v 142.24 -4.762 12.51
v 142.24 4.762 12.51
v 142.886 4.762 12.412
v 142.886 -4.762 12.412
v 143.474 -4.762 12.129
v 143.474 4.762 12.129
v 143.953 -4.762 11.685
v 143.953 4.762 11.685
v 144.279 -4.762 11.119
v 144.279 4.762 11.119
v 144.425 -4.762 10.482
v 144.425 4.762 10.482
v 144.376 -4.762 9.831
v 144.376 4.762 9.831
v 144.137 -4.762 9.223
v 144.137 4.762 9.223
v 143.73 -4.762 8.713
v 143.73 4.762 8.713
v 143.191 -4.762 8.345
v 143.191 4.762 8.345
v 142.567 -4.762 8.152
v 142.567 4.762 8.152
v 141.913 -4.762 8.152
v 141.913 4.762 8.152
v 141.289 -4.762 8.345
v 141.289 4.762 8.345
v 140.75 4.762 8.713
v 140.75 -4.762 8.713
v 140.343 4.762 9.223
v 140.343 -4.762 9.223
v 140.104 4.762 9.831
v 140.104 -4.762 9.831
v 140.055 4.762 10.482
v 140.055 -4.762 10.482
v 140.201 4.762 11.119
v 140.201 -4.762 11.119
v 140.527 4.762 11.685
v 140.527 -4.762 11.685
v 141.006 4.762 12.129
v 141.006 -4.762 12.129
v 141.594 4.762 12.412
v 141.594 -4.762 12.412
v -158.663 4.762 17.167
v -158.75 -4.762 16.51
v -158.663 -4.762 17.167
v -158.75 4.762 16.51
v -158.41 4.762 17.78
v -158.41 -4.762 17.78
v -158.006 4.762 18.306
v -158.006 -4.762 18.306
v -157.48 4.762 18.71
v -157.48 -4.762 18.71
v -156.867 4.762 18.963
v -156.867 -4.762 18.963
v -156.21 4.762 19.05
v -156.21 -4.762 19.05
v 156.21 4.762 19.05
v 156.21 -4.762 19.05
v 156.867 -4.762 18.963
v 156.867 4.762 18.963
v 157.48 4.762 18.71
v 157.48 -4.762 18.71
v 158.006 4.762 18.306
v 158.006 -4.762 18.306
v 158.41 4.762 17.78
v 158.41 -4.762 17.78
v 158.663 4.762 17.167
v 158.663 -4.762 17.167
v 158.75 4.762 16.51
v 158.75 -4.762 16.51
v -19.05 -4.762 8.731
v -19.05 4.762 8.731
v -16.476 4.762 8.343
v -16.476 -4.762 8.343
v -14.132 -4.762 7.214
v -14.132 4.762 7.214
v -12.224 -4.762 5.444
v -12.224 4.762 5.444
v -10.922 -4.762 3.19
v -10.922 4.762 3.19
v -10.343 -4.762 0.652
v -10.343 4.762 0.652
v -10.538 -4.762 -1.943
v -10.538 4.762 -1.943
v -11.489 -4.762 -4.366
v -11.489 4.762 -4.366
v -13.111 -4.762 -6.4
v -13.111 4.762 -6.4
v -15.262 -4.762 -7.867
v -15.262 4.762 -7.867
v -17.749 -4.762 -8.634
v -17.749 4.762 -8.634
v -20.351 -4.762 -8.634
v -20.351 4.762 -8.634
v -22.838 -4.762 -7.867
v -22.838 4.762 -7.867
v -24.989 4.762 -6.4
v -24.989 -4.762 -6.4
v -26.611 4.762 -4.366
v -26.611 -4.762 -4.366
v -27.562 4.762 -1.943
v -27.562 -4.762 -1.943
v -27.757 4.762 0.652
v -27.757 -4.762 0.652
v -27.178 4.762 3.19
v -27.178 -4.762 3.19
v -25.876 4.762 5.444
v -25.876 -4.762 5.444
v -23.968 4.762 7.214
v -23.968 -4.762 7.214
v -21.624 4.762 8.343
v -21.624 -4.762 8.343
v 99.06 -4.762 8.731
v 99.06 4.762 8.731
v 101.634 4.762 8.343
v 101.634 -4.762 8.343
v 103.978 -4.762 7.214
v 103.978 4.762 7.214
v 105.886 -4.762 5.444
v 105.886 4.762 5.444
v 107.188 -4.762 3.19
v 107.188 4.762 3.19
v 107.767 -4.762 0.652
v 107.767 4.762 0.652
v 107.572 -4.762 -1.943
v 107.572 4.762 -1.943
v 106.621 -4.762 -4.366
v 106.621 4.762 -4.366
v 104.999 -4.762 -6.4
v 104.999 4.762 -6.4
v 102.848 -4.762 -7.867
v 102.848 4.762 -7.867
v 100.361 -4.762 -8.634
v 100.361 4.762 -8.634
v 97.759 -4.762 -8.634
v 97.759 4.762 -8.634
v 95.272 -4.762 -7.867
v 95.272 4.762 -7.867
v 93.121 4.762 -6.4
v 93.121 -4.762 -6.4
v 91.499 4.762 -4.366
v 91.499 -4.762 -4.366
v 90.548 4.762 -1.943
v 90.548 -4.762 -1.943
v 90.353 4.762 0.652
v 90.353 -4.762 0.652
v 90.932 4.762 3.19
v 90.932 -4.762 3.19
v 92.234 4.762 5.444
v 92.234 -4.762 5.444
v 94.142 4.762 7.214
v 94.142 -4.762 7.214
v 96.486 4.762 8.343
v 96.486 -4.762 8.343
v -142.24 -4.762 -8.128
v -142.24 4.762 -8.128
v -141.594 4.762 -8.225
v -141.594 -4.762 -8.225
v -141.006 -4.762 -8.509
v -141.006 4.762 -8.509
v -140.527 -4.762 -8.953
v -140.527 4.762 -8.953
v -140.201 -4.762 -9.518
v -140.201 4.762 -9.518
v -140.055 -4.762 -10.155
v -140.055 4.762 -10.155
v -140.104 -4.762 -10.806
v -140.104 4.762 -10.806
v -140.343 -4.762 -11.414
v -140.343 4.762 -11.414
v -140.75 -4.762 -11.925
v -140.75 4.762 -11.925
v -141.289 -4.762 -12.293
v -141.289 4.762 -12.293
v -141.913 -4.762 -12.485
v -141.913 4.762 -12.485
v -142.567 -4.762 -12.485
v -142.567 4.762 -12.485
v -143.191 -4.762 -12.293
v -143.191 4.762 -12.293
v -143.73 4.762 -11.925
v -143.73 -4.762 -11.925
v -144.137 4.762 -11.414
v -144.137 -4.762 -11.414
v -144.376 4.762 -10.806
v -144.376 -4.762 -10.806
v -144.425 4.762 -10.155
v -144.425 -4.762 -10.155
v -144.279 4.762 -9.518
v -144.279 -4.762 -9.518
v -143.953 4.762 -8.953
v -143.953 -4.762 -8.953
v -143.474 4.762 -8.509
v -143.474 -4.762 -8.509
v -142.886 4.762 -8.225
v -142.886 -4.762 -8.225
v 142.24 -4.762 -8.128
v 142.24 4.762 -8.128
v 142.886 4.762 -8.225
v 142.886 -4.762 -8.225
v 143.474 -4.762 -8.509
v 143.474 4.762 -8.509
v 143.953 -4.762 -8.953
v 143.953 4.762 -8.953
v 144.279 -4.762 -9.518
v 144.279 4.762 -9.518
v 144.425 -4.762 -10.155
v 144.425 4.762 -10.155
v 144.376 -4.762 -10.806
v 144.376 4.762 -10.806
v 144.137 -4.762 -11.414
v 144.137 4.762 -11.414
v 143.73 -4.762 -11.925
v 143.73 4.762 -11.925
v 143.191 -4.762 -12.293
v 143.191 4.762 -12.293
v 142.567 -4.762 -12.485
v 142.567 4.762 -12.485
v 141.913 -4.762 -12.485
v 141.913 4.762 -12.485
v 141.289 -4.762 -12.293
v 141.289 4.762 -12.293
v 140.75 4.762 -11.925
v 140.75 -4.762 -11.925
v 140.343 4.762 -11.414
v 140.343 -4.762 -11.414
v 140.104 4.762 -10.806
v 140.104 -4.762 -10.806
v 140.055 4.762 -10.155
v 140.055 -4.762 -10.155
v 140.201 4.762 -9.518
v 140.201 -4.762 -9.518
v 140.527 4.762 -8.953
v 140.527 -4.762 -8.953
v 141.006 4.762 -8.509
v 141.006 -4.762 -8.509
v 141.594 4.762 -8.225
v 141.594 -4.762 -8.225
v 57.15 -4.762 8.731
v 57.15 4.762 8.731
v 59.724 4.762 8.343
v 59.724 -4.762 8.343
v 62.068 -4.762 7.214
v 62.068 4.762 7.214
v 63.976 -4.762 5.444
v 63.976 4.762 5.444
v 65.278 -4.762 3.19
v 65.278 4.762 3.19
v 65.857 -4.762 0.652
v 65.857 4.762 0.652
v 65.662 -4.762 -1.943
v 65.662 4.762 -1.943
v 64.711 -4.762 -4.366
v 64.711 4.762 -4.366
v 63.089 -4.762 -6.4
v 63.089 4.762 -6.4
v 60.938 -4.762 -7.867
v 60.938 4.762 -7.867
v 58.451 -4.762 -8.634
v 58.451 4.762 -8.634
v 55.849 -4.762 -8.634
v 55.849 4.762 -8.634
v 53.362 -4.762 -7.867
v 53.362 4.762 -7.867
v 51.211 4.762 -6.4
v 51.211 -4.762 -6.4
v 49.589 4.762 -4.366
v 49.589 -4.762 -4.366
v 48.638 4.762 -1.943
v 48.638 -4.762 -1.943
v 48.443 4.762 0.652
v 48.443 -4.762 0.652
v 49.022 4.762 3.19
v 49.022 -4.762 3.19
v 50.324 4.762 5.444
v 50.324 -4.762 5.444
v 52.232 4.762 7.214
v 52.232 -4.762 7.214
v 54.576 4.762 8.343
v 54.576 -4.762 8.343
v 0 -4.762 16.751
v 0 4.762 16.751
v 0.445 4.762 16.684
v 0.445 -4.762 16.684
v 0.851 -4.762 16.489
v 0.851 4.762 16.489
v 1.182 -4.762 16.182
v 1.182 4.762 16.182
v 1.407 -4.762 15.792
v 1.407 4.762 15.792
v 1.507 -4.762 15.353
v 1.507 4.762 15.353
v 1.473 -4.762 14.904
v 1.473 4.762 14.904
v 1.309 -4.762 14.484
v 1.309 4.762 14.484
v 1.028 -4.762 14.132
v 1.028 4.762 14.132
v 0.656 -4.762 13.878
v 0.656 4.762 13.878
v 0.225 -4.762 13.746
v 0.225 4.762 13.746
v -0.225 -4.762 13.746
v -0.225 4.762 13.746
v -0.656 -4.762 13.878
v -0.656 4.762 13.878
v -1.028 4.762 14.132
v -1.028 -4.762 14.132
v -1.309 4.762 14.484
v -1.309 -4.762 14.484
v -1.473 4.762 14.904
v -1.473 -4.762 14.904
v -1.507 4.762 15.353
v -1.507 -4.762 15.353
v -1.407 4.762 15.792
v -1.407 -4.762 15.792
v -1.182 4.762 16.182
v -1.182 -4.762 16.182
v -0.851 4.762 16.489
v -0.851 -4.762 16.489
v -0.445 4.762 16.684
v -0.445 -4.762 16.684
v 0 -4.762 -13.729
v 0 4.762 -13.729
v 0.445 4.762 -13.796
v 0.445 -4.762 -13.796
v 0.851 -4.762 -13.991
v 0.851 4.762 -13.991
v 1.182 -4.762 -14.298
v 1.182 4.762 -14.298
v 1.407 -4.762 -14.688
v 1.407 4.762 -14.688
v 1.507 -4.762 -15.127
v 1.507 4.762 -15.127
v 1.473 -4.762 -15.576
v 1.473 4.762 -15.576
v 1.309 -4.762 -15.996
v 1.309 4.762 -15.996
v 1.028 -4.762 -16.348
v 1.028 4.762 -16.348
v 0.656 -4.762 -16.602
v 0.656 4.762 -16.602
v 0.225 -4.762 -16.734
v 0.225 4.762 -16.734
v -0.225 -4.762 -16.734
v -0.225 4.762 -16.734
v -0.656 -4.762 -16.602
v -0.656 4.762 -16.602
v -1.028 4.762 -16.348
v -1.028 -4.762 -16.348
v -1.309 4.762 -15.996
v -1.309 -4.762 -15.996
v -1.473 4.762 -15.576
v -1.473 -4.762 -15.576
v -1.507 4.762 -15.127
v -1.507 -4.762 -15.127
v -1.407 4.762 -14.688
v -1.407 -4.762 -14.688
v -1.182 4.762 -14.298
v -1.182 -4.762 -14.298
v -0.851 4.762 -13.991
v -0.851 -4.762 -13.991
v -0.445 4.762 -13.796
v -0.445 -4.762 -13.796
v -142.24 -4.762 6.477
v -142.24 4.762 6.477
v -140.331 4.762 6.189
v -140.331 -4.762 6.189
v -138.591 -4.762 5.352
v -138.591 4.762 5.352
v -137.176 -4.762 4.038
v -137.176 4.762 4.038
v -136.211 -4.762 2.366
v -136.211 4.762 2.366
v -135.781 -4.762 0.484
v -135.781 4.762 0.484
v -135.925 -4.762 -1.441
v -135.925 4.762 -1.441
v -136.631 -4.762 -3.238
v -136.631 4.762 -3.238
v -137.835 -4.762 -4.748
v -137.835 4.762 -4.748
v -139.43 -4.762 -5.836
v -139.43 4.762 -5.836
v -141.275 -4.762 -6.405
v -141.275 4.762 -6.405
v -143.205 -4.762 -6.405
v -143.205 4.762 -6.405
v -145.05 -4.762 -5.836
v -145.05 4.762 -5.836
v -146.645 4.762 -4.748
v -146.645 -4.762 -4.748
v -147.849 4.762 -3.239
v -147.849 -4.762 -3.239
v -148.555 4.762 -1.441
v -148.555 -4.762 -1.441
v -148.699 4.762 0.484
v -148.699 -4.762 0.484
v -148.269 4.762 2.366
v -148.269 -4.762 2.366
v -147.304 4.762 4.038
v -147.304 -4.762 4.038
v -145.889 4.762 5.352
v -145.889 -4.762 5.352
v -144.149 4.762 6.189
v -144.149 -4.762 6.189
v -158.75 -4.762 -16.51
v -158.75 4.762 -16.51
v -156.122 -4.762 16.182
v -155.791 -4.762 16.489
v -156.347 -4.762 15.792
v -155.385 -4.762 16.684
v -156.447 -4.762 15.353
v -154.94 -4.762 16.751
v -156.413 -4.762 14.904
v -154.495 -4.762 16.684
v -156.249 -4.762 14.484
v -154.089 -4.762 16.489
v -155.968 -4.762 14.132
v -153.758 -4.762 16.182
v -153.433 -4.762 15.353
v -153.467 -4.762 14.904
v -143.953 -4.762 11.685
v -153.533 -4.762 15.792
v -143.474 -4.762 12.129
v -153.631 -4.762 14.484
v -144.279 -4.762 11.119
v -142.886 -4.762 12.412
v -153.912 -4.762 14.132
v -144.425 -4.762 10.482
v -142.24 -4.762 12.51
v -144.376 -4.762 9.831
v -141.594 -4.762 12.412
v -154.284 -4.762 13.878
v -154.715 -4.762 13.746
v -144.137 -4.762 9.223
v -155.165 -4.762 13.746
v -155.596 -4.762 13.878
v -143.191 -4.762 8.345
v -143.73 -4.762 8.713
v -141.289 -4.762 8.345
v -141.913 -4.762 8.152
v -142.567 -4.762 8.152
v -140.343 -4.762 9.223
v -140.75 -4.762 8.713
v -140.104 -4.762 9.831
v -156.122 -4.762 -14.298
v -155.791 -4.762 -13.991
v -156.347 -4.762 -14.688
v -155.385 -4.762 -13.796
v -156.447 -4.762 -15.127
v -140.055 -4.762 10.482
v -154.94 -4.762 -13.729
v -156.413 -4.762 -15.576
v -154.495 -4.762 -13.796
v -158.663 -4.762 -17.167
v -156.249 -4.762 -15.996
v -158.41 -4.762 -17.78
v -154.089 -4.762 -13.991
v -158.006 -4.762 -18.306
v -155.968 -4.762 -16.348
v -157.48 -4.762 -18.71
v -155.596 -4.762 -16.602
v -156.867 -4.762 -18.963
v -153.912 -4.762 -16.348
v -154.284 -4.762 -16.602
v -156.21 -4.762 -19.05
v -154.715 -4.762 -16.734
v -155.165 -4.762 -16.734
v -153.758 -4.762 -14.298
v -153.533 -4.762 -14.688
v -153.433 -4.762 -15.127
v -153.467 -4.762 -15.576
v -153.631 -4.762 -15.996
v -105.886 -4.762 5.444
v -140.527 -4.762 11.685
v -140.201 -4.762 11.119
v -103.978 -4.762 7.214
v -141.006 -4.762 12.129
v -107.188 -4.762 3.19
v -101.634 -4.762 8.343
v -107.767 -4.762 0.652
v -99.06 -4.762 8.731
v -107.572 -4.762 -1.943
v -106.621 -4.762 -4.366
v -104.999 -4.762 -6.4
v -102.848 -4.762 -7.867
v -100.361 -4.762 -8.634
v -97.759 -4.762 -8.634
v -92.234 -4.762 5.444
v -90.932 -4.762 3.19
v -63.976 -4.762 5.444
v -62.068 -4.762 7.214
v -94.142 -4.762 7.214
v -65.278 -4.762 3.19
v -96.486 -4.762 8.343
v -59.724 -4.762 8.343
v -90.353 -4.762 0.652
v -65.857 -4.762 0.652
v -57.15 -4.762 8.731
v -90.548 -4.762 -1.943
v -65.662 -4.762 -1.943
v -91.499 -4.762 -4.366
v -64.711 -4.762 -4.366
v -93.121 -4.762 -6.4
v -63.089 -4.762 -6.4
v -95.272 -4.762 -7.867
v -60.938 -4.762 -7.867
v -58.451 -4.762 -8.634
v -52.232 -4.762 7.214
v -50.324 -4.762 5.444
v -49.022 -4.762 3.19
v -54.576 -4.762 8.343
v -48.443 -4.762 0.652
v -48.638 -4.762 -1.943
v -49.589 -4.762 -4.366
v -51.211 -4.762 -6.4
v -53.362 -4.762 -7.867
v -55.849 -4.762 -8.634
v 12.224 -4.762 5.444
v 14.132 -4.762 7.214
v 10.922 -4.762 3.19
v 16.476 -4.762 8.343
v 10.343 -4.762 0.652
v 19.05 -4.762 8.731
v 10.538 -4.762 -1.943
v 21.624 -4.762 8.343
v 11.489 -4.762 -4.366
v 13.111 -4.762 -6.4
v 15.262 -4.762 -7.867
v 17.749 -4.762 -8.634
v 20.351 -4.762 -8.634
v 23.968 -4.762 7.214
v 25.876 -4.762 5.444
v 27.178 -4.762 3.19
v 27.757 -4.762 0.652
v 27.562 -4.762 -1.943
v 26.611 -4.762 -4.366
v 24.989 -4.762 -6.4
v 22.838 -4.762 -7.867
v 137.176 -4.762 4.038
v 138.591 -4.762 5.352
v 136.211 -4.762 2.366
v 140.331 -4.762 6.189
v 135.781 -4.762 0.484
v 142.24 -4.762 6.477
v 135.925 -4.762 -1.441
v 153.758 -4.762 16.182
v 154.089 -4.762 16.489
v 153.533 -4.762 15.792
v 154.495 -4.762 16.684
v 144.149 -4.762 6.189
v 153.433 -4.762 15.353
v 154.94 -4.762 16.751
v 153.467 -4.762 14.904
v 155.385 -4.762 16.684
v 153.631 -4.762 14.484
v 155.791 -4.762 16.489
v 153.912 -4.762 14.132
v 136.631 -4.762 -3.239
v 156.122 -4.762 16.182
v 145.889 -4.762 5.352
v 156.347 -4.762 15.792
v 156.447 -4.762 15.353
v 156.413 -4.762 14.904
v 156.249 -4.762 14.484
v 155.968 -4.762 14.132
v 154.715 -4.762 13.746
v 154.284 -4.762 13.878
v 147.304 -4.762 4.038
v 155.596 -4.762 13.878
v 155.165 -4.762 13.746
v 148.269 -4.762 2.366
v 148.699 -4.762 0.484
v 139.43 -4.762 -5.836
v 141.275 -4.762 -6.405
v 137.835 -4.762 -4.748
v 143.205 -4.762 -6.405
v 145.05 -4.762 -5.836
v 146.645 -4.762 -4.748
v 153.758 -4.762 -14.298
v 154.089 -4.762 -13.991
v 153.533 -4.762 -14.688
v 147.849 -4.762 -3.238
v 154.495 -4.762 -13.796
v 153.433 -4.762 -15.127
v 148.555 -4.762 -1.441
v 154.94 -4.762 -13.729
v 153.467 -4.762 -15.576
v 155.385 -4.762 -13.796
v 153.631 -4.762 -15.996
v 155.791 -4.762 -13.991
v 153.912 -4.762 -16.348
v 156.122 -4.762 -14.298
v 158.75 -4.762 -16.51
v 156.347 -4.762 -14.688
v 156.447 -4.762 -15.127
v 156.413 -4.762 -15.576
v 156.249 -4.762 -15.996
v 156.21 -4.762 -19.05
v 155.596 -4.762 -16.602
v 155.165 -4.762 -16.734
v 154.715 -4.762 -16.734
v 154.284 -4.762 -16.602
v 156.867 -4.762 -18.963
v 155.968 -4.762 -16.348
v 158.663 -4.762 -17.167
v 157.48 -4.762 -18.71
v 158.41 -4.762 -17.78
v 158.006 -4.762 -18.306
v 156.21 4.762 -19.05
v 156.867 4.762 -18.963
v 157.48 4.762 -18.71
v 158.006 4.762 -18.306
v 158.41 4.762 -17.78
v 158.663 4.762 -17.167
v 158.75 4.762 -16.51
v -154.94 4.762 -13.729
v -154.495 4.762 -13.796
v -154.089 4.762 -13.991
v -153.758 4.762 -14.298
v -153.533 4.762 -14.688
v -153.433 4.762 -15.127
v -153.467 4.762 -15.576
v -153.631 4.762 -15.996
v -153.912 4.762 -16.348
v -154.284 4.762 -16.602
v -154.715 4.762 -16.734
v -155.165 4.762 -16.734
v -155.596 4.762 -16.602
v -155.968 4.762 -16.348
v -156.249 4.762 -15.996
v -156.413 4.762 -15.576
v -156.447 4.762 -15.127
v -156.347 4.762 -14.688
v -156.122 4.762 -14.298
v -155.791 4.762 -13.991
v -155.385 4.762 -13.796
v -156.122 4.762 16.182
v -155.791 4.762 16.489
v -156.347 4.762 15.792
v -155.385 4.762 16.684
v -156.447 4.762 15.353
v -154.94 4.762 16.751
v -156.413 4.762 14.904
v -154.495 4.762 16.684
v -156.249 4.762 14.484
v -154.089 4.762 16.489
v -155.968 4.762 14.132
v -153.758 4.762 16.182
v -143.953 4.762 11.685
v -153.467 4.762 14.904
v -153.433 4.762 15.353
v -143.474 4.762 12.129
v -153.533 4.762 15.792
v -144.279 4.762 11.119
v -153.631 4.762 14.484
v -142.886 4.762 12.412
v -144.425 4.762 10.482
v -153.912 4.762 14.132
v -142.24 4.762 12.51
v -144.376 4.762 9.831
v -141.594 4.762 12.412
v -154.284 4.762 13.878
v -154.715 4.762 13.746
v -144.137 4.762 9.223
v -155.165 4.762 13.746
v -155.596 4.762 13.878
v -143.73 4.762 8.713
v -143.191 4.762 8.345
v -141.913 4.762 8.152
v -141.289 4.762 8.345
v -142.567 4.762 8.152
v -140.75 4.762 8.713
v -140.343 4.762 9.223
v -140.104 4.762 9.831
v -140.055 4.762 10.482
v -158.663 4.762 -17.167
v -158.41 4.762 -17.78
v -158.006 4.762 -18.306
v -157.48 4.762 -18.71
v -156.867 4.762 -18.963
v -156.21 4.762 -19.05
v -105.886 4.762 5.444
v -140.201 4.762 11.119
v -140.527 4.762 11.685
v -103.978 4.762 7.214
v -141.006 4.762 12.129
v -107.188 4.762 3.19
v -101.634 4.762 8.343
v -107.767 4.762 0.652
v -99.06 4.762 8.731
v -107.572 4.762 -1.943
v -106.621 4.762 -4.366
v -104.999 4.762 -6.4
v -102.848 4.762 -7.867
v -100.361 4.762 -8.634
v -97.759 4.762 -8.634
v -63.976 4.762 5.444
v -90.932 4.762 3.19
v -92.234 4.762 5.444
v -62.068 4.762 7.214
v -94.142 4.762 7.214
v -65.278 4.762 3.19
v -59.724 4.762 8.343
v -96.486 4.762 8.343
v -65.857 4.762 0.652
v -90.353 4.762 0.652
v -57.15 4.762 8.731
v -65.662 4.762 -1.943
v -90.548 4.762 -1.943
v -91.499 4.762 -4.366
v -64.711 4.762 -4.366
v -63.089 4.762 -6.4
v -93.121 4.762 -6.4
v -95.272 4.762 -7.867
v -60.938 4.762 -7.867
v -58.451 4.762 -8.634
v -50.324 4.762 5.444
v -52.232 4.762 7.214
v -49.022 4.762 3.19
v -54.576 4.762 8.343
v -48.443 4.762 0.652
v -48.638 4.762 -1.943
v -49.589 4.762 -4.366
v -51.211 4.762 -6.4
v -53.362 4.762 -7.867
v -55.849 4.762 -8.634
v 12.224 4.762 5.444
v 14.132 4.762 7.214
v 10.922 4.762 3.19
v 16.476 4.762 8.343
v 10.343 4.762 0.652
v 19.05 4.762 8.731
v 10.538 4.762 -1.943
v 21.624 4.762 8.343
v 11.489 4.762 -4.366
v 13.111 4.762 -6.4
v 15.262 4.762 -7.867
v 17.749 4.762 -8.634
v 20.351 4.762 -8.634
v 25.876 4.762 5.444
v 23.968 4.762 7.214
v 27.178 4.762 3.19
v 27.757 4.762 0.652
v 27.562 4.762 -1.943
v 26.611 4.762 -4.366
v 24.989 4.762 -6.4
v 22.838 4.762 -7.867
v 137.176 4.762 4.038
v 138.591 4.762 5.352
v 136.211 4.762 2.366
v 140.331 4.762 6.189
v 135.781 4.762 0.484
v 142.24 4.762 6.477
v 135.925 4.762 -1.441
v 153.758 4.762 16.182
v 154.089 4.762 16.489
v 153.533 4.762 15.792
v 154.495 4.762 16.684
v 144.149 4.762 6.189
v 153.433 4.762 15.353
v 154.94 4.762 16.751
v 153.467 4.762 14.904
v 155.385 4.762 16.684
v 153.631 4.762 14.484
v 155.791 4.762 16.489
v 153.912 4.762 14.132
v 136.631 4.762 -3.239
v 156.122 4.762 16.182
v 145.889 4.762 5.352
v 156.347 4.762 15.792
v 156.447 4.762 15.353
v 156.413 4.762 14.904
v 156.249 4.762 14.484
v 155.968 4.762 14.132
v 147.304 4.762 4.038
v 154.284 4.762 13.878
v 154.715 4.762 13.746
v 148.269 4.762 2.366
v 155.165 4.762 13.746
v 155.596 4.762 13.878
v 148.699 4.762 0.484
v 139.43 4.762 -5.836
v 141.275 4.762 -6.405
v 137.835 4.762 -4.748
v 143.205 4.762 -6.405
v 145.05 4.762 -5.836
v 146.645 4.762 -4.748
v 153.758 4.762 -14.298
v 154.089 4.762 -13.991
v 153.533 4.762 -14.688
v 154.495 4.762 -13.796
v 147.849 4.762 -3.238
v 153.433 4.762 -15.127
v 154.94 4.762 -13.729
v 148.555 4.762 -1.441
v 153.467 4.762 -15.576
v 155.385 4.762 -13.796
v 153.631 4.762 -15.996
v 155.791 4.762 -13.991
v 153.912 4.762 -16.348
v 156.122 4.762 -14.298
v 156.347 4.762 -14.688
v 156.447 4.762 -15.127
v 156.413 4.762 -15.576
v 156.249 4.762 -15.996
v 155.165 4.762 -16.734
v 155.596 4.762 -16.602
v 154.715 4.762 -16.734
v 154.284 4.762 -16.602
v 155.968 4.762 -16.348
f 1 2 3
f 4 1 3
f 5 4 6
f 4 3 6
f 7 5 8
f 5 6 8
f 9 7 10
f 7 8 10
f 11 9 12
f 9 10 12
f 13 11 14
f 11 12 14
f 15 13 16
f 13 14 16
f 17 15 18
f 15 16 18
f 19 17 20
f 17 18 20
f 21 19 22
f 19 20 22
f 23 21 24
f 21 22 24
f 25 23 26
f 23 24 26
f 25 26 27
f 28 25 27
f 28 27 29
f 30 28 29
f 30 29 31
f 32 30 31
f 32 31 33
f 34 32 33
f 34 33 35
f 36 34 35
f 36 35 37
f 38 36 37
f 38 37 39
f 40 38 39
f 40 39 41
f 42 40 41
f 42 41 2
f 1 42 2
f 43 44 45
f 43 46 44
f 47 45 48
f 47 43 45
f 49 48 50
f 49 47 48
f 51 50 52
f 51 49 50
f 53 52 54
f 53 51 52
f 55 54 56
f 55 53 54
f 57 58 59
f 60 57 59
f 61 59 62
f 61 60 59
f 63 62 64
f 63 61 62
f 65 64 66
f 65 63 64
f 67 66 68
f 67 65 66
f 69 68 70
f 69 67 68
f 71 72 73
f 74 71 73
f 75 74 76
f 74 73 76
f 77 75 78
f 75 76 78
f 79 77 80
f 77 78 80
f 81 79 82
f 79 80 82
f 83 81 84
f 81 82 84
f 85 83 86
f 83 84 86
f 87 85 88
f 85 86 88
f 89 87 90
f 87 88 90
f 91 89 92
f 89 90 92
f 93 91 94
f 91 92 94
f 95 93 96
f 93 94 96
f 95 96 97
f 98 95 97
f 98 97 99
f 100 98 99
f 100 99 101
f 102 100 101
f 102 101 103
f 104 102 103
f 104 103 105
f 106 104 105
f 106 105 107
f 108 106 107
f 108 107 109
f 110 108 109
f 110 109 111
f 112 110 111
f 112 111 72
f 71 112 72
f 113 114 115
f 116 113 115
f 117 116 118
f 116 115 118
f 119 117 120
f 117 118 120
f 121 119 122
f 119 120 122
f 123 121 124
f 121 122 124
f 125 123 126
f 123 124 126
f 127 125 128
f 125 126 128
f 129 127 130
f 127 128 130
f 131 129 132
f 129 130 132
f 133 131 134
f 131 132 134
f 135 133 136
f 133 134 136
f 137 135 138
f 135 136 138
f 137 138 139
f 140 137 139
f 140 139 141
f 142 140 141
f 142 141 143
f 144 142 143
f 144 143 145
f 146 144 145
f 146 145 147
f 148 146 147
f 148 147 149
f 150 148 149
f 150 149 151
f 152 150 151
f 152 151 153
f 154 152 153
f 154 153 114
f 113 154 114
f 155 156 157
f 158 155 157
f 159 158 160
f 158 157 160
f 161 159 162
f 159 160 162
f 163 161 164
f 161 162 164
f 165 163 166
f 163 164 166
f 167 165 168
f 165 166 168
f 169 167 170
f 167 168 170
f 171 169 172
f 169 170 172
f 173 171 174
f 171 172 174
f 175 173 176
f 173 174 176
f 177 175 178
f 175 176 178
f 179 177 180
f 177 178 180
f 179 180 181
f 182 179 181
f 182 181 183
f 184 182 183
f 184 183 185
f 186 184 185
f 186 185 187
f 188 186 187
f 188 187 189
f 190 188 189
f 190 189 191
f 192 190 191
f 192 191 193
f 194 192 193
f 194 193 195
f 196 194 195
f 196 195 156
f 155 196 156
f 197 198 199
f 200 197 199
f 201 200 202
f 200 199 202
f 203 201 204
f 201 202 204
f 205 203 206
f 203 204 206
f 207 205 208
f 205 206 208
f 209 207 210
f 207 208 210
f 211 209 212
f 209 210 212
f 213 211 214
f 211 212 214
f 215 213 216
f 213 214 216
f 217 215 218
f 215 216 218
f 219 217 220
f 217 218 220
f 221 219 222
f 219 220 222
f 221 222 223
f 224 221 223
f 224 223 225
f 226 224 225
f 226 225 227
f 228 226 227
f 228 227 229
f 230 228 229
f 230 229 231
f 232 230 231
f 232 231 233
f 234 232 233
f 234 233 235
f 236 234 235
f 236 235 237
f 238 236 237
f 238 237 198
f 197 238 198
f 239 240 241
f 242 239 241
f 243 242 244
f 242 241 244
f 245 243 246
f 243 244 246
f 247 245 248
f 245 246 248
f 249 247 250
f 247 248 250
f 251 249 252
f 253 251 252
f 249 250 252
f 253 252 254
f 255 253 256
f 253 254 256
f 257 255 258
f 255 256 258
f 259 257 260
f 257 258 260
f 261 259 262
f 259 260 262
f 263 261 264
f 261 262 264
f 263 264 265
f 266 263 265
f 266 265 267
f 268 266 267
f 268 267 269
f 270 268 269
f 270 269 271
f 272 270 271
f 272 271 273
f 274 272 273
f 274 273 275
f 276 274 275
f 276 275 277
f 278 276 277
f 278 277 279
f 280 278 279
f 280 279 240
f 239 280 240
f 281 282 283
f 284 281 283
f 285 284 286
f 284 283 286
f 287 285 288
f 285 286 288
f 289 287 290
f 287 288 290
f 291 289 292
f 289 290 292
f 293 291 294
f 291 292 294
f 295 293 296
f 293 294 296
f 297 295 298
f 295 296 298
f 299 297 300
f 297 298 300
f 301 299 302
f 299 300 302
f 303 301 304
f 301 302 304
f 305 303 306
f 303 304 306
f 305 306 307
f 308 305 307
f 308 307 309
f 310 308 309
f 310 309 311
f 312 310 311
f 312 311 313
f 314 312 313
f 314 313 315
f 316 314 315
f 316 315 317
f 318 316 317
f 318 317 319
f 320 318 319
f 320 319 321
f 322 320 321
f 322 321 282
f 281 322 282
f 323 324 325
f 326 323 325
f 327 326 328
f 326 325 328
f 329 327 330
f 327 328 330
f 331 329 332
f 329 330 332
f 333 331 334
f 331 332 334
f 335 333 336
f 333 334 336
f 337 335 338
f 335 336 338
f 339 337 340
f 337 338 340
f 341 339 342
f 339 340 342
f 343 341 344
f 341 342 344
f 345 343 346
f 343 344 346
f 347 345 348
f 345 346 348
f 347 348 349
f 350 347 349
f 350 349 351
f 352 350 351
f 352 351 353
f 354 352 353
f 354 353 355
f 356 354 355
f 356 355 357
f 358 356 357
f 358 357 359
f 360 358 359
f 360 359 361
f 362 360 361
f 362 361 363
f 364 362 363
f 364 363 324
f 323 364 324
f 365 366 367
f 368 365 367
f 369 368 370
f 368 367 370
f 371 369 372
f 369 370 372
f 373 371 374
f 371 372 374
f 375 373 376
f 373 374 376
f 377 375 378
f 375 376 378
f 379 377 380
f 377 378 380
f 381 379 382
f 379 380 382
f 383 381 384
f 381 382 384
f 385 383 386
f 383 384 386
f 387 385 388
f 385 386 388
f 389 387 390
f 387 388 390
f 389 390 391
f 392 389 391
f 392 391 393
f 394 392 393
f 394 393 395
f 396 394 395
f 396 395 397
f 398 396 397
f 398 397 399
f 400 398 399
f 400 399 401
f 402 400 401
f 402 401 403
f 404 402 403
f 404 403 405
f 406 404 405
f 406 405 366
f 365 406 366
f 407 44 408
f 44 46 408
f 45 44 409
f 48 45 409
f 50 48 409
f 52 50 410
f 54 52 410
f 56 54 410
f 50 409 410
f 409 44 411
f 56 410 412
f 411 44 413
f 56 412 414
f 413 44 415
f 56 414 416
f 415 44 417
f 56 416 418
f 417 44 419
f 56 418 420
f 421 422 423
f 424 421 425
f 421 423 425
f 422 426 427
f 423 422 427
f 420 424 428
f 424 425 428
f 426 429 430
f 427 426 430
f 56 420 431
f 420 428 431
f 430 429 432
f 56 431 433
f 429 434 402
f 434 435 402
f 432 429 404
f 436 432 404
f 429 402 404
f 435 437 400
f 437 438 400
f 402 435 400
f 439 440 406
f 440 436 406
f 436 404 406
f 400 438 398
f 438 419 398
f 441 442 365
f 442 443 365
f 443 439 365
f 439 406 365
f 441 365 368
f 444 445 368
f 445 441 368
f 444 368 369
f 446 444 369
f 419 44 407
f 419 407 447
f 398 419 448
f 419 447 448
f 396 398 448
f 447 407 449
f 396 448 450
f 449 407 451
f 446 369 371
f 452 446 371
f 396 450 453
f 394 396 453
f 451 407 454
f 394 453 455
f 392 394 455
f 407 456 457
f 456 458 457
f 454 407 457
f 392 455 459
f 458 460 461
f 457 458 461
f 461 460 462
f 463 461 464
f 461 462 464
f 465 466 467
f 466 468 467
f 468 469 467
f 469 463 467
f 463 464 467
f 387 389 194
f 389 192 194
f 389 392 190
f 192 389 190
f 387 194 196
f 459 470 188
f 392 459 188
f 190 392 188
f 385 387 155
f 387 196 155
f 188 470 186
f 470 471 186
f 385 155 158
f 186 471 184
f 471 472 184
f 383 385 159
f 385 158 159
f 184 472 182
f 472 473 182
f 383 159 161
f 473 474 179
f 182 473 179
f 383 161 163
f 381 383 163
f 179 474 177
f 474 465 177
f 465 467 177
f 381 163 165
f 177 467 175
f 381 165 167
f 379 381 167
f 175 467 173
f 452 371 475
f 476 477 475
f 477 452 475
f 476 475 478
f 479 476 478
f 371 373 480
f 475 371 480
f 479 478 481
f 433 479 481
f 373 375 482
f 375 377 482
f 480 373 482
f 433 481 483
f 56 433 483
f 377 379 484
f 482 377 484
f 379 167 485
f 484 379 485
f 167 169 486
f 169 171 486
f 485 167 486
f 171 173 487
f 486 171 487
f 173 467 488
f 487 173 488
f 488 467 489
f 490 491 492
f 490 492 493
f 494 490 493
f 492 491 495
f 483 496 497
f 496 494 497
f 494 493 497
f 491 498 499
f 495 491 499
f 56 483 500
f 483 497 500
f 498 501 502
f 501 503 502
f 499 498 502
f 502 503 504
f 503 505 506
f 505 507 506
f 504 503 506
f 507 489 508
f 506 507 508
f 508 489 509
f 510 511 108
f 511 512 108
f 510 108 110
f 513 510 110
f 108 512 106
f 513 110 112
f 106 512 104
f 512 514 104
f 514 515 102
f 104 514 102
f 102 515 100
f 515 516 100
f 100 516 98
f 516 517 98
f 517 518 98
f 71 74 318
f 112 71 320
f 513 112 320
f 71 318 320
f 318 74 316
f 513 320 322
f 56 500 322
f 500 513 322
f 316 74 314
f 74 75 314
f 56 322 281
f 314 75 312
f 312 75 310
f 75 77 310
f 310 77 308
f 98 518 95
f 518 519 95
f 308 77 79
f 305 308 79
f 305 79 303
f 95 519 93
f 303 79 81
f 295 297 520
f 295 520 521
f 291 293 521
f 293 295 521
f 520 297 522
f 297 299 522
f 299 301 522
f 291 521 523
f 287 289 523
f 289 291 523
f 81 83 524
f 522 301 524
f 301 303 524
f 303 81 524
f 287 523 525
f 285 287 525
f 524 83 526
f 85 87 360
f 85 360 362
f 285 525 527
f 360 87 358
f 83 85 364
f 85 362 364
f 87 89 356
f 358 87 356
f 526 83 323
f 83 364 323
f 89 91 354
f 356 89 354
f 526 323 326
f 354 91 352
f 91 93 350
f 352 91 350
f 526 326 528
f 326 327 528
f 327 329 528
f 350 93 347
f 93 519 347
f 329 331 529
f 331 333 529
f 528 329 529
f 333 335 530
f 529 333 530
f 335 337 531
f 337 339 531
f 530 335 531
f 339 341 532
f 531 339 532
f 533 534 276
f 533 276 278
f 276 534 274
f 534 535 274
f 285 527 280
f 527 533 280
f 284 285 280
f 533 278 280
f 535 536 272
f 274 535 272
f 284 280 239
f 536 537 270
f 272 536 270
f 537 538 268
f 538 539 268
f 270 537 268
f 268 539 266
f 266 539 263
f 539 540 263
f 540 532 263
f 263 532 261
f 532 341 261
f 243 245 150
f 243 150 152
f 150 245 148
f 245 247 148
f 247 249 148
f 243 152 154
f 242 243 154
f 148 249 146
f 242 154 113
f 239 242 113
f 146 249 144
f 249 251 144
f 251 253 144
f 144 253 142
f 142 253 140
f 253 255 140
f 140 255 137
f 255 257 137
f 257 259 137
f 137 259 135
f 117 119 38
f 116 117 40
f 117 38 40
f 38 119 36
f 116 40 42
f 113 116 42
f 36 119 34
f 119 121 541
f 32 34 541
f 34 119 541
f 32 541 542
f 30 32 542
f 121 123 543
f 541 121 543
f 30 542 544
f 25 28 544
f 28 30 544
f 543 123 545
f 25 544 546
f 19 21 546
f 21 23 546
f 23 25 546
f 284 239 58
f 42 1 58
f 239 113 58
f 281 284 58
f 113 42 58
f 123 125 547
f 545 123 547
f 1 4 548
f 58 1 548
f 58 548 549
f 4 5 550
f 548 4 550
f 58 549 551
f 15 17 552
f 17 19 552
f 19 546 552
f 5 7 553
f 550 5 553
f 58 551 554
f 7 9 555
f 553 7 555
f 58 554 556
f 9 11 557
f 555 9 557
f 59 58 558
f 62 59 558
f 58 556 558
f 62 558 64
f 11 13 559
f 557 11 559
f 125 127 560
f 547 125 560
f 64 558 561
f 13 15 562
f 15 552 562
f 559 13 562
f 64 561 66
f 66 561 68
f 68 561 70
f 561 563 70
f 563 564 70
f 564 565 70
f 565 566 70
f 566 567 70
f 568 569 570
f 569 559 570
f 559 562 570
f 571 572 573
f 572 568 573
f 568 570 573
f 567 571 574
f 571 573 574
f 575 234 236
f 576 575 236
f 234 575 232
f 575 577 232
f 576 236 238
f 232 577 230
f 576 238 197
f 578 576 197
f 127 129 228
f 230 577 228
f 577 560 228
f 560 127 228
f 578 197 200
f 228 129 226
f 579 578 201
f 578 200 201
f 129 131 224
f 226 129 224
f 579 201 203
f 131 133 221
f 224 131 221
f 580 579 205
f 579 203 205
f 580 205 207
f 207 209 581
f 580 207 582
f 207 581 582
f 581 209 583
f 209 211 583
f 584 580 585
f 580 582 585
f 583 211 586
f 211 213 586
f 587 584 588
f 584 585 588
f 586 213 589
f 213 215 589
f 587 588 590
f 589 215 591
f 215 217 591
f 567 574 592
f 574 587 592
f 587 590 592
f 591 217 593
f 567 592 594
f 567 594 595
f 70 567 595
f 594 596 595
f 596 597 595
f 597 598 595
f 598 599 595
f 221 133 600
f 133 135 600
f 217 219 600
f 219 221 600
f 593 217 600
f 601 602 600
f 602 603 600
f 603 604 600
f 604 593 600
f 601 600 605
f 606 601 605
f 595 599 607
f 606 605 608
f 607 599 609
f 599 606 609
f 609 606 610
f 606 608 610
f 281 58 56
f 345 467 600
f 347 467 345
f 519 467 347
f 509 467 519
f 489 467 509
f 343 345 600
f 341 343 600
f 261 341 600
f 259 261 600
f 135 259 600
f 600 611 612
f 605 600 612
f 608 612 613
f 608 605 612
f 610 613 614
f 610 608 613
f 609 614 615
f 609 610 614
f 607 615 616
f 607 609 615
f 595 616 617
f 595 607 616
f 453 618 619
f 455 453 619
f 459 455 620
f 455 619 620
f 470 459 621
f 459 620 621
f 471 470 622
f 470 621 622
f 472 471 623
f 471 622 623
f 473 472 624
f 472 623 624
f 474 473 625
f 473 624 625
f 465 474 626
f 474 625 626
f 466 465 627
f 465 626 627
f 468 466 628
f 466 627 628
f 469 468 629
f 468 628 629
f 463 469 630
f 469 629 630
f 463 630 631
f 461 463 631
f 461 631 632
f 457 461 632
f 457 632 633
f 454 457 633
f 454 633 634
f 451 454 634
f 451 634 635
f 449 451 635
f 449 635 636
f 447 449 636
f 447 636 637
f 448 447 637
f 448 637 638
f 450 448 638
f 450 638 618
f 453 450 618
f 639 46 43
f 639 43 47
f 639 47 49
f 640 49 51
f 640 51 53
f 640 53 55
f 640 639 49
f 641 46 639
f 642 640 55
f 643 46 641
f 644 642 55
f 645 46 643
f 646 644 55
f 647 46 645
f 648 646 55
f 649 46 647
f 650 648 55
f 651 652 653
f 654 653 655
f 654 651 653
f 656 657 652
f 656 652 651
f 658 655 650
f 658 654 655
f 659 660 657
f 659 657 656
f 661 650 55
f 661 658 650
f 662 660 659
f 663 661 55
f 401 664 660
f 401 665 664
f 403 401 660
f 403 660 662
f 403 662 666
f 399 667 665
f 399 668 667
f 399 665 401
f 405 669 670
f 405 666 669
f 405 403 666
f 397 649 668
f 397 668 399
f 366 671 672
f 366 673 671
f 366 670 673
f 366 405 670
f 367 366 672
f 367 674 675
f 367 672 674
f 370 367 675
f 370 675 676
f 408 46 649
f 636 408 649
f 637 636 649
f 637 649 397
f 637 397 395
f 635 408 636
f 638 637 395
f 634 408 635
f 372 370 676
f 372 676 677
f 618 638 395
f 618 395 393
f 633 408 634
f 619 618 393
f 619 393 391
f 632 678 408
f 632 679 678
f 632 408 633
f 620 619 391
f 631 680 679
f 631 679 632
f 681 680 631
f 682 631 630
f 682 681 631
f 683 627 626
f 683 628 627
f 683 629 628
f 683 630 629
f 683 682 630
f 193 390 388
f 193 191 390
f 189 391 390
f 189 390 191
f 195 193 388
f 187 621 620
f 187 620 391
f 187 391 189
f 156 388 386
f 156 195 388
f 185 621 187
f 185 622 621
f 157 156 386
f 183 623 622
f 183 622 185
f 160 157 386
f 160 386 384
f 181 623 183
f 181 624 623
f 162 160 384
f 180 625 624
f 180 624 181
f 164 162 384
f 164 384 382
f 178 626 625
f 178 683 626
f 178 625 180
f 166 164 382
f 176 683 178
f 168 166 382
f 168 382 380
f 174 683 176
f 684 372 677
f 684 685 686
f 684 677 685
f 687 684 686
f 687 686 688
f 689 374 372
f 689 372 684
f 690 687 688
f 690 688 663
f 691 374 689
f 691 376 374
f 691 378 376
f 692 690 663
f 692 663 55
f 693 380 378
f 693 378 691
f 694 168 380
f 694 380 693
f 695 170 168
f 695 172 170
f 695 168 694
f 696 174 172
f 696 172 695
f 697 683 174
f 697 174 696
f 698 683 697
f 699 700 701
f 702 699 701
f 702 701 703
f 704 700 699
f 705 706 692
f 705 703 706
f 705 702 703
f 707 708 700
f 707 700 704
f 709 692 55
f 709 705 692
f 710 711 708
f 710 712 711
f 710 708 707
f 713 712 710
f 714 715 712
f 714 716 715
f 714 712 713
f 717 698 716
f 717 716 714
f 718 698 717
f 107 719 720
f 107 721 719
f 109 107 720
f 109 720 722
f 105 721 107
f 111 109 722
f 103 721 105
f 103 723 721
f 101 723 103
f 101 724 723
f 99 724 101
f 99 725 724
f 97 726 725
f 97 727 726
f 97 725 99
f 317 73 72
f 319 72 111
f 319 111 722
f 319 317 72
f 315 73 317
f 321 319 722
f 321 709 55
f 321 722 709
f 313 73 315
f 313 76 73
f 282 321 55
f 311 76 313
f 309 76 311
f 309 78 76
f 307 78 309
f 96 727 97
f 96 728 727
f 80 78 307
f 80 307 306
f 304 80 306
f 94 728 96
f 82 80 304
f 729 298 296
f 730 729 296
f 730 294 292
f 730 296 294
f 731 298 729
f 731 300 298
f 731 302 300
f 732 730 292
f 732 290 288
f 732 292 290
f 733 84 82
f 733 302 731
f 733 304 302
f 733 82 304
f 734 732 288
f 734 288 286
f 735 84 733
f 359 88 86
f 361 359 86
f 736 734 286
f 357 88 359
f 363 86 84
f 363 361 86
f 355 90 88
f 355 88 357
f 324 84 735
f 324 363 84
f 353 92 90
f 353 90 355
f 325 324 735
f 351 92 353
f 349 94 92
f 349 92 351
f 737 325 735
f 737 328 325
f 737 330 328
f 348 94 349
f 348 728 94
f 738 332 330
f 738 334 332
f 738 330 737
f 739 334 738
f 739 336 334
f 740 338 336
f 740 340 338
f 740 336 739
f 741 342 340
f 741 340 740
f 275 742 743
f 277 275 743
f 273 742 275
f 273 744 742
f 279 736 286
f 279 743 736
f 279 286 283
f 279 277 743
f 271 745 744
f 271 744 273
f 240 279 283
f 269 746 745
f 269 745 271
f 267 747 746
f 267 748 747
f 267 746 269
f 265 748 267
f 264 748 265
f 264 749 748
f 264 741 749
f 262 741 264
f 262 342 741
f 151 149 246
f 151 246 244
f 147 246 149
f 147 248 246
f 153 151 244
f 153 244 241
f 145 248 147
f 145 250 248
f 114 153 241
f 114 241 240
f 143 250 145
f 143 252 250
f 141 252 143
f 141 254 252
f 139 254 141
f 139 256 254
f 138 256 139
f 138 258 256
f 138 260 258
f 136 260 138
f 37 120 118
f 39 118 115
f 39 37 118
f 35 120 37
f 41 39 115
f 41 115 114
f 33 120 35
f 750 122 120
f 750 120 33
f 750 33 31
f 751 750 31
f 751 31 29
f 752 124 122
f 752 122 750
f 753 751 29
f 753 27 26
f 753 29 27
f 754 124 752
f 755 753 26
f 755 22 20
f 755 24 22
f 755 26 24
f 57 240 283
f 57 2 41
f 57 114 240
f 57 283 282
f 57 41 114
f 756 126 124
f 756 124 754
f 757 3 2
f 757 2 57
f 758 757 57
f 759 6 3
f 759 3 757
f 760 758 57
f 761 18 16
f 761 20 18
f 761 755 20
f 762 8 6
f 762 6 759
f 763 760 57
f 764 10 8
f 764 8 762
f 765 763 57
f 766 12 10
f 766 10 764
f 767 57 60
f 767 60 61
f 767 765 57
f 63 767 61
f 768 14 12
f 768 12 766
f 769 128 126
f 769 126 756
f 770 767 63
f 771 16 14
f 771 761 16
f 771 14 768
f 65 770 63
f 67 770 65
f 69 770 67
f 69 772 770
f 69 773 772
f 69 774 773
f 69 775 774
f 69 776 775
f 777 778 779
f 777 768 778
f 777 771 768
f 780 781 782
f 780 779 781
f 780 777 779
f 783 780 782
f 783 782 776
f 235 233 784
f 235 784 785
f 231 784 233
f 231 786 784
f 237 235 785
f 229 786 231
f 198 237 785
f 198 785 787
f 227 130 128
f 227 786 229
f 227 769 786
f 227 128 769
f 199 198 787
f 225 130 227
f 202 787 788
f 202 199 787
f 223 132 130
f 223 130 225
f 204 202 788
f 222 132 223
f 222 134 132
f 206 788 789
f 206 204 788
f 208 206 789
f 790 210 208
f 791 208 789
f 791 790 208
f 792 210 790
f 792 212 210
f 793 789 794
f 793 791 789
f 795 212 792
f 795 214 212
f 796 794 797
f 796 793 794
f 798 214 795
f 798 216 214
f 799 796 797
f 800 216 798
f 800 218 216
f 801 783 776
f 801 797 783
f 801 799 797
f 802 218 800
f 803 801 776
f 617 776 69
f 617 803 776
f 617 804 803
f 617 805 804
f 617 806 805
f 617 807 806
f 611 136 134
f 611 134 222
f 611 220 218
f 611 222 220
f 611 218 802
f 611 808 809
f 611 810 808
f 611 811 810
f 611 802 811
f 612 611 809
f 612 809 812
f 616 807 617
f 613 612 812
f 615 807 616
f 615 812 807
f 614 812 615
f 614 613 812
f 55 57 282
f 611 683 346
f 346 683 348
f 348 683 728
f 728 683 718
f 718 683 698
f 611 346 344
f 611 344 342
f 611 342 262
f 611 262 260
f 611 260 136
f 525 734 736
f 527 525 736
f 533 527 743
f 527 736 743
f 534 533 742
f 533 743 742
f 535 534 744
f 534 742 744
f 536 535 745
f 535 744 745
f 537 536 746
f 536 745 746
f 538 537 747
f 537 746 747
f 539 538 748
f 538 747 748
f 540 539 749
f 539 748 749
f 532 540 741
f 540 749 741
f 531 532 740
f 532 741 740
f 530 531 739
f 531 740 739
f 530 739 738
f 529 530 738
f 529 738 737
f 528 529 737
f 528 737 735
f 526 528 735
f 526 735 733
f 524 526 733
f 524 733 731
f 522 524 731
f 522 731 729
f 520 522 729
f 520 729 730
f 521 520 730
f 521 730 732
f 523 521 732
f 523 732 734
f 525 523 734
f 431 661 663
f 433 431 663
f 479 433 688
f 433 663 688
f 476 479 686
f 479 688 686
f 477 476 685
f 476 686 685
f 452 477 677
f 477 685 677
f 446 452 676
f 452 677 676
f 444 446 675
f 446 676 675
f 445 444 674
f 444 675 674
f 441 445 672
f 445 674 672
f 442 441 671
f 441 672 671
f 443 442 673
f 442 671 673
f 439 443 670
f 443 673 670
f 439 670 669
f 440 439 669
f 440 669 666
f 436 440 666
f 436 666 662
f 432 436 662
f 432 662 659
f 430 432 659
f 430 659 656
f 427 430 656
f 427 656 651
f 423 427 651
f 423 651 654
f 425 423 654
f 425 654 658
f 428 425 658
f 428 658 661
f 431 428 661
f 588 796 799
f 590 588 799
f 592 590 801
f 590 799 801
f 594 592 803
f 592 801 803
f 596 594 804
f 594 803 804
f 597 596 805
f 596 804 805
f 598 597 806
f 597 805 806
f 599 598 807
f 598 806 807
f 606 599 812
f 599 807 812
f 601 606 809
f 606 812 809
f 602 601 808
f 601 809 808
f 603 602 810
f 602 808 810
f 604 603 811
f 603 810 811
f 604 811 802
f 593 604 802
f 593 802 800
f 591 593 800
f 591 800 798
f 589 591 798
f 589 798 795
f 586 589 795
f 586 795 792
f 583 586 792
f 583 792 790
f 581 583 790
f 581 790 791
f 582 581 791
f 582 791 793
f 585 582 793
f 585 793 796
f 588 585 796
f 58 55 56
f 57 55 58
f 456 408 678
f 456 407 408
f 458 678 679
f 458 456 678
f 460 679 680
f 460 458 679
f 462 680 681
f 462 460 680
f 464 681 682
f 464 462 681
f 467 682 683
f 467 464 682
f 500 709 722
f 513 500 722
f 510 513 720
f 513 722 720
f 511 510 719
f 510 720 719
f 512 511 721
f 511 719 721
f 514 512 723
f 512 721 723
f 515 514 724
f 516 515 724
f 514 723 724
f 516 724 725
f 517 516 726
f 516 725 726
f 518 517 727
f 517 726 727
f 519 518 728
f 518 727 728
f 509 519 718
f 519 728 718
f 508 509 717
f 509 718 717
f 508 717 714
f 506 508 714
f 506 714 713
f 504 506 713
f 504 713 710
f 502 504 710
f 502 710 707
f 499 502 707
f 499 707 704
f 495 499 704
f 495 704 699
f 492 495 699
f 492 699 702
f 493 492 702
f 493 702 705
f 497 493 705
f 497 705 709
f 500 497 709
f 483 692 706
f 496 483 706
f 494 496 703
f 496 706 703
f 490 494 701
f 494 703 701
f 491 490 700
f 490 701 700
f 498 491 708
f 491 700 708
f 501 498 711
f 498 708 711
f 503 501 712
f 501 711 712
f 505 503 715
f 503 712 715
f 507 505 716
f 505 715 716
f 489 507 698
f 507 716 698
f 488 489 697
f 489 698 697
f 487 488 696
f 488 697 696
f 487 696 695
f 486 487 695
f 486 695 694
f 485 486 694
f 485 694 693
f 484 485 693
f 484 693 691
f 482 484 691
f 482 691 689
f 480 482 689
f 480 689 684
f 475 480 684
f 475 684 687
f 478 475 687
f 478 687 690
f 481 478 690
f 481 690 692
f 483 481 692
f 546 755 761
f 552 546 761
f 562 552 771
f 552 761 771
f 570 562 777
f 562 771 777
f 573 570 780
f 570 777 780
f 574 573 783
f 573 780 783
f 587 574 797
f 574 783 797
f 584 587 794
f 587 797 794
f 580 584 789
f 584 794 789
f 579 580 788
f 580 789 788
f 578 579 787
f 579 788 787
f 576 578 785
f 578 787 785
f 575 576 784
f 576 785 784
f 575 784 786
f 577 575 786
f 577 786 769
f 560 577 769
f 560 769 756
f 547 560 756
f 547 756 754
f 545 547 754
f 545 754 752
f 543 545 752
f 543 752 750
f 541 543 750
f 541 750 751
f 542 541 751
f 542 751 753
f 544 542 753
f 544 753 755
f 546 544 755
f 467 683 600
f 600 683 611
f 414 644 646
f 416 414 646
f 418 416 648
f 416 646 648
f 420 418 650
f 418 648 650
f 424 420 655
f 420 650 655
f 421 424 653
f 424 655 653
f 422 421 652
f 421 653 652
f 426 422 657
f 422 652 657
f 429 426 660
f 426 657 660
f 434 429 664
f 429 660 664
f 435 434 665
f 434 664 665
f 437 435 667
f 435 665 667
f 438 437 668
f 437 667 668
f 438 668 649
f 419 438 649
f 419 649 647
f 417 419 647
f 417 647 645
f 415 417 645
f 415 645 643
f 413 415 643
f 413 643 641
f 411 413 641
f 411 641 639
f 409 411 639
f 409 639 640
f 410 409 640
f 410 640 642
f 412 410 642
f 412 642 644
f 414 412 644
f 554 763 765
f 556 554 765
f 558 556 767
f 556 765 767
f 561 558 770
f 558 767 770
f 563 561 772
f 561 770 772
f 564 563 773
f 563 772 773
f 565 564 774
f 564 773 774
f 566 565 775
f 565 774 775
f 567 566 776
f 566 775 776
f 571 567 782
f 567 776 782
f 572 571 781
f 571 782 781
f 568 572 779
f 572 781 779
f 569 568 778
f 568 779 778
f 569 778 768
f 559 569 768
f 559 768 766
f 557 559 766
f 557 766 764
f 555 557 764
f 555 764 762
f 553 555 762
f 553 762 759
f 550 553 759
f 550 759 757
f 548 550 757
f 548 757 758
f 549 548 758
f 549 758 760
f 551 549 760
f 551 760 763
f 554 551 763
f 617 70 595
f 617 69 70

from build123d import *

# Parameters (mm, degrees)
SKETCH1_W           = 317.5
SKETCH1_H           = 38.1
BOSS_EXTRUDE1_DEPTH = 4.7625
SKETCH2_R           = 4.4196
SKETCH2_R_2         = 6.477
SKETCH2_R_3         = 2.19075
CUT_EXTRUDE1_DEPTH  = 161.172377846
SKETCH3_R           = 1.5113
CUT_EXTRUDE2_DEPTH  = 161.172377846
FILLET1_R           = 2.54
SKETCH4_R           = 8.73125
CUT_EXTRUDE3_DEPTH  = 161.172377846


with BuildPart() as part:
    # Sketch1 → Boss-Extrude1 (new, symmetric)
    with BuildSketch(Plane(origin=(0, 0, 0), x_dir=(1, 0, 0), z_dir=(0, 1, 0))):
        Rectangle(SKETCH1_W, SKETCH1_H)
    extrude(amount=BOSS_EXTRUDE1_DEPTH, both=True)

    # Sketch2 → Cut-Extrude1 (cut, through all)
    with BuildSketch(Plane(origin=(0, 4.7625, 0), x_dir=(1, 0, 0), z_dir=(0, 1, 0))):
        with Locations(Location((-99.06, 0, 0), (0, 0, 270))):
            Circle(SKETCH2_R)
        with Locations(Location((-57.15, 0, 0), (0, 0, 270))):
            Circle(SKETCH2_R)
        with Locations(Location((-19.05, 0, 0), (0, 0, 270))):
            Circle(SKETCH2_R)
        with Locations(Location((19.05, 0, 0), (0, 0, 270))):
            Circle(SKETCH2_R)
        with Locations(Location((57.15, 0, 0), (0, 0, 270))):
            Circle(SKETCH2_R)
        with Locations(Location((-142.24, 0, 0), (0, 0, 270))):
            Circle(SKETCH2_R_2)
        with Locations(Location((-142.24, -10.31875, 0), (0, 0, 270))):
            Circle(SKETCH2_R_3)
        with Locations(Location((-142.24, 10.31875, 0), (0, 0, 270))):
            Circle(SKETCH2_R_3)
        with Locations(Location((142.24, 0, 0), (0, 0, 270))):
            Circle(SKETCH2_R_2)
        with Locations(Location((142.24, -10.31875, 0), (0, 0, 270))):
            Circle(SKETCH2_R_3)
        with Locations(Location((142.24, 10.31875, 0), (0, 0, 270))):
            Circle(SKETCH2_R_3)
        with Locations(Location((99.06, 0, 0), (0, 0, 270))):
            Circle(SKETCH2_R)
    extrude(amount=-CUT_EXTRUDE1_DEPTH, mode=Mode.SUBTRACT)

    # Sketch3 → Cut-Extrude2 (cut, through all)
    with BuildSketch(Plane(origin=(0, 4.7625, 0), x_dir=(1, 0, 0), z_dir=(0, 1, 0))):
        with Locations(Location((-154.94, 15.24, 0), (0, 0, 270))):
            Circle(SKETCH3_R)
        with Locations(Location((-154.94, -15.24, 0), (0, 0, 270))):
            Circle(SKETCH3_R)
        with Locations(Location((154.94, -15.24, 0), (0, 0, 270))):
            Circle(SKETCH3_R)
        with Locations(Location((154.94, 15.24, 0), (0, 0, 270))):
            Circle(SKETCH3_R)
        with Locations(Location((0, 15.24, 0), (0, 0, 270))):
            Circle(SKETCH3_R)
        with Locations(Location((0, -15.24, 0), (0, 0, 270))):
            Circle(SKETCH3_R)
    extrude(amount=-CUT_EXTRUDE2_DEPTH, mode=Mode.SUBTRACT)

    # Fillet1
    fillet1_edges = [part.edges().sort_by_distance(p)[0] for p in [
        (158.75, 0, 19.05),
        (-158.75, 0, 19.05),
        (-158.75, 0, -19.05),
        (158.75, 0, -19.05),
    ]]
    fillet(fillet1_edges, radius=FILLET1_R)

    # Sketch4 → Cut-Extrude3 (cut, through all)
    with BuildSketch(Plane(origin=(0, 4.7625, 0), x_dir=(1, 0, 0), z_dir=(0, 1, 0))):
        with Locations(Location((99.06, 0, 0), (0, 0, 270))):
            Circle(SKETCH4_R)
        with Locations(Location((-99.06, 0, 0), (0, 0, 270))):
            Circle(SKETCH4_R)
        with Locations(Location((-57.15, 0, 0), (0, 0, 270))):
            Circle(SKETCH4_R)
        with Locations(Location((-19.05, 0, 0), (0, 0, 270))):
            Circle(SKETCH4_R)
        with Locations(Location((19.05, 0, 0), (0, 0, 270))):
            Circle(SKETCH4_R)
        with Locations(Location((57.15, 0, 0), (0, 0, 270))):
            Circle(SKETCH4_R)
    extrude(amount=-CUT_EXTRUDE3_DEPTH, mode=Mode.SUBTRACT)


solid = part.part
